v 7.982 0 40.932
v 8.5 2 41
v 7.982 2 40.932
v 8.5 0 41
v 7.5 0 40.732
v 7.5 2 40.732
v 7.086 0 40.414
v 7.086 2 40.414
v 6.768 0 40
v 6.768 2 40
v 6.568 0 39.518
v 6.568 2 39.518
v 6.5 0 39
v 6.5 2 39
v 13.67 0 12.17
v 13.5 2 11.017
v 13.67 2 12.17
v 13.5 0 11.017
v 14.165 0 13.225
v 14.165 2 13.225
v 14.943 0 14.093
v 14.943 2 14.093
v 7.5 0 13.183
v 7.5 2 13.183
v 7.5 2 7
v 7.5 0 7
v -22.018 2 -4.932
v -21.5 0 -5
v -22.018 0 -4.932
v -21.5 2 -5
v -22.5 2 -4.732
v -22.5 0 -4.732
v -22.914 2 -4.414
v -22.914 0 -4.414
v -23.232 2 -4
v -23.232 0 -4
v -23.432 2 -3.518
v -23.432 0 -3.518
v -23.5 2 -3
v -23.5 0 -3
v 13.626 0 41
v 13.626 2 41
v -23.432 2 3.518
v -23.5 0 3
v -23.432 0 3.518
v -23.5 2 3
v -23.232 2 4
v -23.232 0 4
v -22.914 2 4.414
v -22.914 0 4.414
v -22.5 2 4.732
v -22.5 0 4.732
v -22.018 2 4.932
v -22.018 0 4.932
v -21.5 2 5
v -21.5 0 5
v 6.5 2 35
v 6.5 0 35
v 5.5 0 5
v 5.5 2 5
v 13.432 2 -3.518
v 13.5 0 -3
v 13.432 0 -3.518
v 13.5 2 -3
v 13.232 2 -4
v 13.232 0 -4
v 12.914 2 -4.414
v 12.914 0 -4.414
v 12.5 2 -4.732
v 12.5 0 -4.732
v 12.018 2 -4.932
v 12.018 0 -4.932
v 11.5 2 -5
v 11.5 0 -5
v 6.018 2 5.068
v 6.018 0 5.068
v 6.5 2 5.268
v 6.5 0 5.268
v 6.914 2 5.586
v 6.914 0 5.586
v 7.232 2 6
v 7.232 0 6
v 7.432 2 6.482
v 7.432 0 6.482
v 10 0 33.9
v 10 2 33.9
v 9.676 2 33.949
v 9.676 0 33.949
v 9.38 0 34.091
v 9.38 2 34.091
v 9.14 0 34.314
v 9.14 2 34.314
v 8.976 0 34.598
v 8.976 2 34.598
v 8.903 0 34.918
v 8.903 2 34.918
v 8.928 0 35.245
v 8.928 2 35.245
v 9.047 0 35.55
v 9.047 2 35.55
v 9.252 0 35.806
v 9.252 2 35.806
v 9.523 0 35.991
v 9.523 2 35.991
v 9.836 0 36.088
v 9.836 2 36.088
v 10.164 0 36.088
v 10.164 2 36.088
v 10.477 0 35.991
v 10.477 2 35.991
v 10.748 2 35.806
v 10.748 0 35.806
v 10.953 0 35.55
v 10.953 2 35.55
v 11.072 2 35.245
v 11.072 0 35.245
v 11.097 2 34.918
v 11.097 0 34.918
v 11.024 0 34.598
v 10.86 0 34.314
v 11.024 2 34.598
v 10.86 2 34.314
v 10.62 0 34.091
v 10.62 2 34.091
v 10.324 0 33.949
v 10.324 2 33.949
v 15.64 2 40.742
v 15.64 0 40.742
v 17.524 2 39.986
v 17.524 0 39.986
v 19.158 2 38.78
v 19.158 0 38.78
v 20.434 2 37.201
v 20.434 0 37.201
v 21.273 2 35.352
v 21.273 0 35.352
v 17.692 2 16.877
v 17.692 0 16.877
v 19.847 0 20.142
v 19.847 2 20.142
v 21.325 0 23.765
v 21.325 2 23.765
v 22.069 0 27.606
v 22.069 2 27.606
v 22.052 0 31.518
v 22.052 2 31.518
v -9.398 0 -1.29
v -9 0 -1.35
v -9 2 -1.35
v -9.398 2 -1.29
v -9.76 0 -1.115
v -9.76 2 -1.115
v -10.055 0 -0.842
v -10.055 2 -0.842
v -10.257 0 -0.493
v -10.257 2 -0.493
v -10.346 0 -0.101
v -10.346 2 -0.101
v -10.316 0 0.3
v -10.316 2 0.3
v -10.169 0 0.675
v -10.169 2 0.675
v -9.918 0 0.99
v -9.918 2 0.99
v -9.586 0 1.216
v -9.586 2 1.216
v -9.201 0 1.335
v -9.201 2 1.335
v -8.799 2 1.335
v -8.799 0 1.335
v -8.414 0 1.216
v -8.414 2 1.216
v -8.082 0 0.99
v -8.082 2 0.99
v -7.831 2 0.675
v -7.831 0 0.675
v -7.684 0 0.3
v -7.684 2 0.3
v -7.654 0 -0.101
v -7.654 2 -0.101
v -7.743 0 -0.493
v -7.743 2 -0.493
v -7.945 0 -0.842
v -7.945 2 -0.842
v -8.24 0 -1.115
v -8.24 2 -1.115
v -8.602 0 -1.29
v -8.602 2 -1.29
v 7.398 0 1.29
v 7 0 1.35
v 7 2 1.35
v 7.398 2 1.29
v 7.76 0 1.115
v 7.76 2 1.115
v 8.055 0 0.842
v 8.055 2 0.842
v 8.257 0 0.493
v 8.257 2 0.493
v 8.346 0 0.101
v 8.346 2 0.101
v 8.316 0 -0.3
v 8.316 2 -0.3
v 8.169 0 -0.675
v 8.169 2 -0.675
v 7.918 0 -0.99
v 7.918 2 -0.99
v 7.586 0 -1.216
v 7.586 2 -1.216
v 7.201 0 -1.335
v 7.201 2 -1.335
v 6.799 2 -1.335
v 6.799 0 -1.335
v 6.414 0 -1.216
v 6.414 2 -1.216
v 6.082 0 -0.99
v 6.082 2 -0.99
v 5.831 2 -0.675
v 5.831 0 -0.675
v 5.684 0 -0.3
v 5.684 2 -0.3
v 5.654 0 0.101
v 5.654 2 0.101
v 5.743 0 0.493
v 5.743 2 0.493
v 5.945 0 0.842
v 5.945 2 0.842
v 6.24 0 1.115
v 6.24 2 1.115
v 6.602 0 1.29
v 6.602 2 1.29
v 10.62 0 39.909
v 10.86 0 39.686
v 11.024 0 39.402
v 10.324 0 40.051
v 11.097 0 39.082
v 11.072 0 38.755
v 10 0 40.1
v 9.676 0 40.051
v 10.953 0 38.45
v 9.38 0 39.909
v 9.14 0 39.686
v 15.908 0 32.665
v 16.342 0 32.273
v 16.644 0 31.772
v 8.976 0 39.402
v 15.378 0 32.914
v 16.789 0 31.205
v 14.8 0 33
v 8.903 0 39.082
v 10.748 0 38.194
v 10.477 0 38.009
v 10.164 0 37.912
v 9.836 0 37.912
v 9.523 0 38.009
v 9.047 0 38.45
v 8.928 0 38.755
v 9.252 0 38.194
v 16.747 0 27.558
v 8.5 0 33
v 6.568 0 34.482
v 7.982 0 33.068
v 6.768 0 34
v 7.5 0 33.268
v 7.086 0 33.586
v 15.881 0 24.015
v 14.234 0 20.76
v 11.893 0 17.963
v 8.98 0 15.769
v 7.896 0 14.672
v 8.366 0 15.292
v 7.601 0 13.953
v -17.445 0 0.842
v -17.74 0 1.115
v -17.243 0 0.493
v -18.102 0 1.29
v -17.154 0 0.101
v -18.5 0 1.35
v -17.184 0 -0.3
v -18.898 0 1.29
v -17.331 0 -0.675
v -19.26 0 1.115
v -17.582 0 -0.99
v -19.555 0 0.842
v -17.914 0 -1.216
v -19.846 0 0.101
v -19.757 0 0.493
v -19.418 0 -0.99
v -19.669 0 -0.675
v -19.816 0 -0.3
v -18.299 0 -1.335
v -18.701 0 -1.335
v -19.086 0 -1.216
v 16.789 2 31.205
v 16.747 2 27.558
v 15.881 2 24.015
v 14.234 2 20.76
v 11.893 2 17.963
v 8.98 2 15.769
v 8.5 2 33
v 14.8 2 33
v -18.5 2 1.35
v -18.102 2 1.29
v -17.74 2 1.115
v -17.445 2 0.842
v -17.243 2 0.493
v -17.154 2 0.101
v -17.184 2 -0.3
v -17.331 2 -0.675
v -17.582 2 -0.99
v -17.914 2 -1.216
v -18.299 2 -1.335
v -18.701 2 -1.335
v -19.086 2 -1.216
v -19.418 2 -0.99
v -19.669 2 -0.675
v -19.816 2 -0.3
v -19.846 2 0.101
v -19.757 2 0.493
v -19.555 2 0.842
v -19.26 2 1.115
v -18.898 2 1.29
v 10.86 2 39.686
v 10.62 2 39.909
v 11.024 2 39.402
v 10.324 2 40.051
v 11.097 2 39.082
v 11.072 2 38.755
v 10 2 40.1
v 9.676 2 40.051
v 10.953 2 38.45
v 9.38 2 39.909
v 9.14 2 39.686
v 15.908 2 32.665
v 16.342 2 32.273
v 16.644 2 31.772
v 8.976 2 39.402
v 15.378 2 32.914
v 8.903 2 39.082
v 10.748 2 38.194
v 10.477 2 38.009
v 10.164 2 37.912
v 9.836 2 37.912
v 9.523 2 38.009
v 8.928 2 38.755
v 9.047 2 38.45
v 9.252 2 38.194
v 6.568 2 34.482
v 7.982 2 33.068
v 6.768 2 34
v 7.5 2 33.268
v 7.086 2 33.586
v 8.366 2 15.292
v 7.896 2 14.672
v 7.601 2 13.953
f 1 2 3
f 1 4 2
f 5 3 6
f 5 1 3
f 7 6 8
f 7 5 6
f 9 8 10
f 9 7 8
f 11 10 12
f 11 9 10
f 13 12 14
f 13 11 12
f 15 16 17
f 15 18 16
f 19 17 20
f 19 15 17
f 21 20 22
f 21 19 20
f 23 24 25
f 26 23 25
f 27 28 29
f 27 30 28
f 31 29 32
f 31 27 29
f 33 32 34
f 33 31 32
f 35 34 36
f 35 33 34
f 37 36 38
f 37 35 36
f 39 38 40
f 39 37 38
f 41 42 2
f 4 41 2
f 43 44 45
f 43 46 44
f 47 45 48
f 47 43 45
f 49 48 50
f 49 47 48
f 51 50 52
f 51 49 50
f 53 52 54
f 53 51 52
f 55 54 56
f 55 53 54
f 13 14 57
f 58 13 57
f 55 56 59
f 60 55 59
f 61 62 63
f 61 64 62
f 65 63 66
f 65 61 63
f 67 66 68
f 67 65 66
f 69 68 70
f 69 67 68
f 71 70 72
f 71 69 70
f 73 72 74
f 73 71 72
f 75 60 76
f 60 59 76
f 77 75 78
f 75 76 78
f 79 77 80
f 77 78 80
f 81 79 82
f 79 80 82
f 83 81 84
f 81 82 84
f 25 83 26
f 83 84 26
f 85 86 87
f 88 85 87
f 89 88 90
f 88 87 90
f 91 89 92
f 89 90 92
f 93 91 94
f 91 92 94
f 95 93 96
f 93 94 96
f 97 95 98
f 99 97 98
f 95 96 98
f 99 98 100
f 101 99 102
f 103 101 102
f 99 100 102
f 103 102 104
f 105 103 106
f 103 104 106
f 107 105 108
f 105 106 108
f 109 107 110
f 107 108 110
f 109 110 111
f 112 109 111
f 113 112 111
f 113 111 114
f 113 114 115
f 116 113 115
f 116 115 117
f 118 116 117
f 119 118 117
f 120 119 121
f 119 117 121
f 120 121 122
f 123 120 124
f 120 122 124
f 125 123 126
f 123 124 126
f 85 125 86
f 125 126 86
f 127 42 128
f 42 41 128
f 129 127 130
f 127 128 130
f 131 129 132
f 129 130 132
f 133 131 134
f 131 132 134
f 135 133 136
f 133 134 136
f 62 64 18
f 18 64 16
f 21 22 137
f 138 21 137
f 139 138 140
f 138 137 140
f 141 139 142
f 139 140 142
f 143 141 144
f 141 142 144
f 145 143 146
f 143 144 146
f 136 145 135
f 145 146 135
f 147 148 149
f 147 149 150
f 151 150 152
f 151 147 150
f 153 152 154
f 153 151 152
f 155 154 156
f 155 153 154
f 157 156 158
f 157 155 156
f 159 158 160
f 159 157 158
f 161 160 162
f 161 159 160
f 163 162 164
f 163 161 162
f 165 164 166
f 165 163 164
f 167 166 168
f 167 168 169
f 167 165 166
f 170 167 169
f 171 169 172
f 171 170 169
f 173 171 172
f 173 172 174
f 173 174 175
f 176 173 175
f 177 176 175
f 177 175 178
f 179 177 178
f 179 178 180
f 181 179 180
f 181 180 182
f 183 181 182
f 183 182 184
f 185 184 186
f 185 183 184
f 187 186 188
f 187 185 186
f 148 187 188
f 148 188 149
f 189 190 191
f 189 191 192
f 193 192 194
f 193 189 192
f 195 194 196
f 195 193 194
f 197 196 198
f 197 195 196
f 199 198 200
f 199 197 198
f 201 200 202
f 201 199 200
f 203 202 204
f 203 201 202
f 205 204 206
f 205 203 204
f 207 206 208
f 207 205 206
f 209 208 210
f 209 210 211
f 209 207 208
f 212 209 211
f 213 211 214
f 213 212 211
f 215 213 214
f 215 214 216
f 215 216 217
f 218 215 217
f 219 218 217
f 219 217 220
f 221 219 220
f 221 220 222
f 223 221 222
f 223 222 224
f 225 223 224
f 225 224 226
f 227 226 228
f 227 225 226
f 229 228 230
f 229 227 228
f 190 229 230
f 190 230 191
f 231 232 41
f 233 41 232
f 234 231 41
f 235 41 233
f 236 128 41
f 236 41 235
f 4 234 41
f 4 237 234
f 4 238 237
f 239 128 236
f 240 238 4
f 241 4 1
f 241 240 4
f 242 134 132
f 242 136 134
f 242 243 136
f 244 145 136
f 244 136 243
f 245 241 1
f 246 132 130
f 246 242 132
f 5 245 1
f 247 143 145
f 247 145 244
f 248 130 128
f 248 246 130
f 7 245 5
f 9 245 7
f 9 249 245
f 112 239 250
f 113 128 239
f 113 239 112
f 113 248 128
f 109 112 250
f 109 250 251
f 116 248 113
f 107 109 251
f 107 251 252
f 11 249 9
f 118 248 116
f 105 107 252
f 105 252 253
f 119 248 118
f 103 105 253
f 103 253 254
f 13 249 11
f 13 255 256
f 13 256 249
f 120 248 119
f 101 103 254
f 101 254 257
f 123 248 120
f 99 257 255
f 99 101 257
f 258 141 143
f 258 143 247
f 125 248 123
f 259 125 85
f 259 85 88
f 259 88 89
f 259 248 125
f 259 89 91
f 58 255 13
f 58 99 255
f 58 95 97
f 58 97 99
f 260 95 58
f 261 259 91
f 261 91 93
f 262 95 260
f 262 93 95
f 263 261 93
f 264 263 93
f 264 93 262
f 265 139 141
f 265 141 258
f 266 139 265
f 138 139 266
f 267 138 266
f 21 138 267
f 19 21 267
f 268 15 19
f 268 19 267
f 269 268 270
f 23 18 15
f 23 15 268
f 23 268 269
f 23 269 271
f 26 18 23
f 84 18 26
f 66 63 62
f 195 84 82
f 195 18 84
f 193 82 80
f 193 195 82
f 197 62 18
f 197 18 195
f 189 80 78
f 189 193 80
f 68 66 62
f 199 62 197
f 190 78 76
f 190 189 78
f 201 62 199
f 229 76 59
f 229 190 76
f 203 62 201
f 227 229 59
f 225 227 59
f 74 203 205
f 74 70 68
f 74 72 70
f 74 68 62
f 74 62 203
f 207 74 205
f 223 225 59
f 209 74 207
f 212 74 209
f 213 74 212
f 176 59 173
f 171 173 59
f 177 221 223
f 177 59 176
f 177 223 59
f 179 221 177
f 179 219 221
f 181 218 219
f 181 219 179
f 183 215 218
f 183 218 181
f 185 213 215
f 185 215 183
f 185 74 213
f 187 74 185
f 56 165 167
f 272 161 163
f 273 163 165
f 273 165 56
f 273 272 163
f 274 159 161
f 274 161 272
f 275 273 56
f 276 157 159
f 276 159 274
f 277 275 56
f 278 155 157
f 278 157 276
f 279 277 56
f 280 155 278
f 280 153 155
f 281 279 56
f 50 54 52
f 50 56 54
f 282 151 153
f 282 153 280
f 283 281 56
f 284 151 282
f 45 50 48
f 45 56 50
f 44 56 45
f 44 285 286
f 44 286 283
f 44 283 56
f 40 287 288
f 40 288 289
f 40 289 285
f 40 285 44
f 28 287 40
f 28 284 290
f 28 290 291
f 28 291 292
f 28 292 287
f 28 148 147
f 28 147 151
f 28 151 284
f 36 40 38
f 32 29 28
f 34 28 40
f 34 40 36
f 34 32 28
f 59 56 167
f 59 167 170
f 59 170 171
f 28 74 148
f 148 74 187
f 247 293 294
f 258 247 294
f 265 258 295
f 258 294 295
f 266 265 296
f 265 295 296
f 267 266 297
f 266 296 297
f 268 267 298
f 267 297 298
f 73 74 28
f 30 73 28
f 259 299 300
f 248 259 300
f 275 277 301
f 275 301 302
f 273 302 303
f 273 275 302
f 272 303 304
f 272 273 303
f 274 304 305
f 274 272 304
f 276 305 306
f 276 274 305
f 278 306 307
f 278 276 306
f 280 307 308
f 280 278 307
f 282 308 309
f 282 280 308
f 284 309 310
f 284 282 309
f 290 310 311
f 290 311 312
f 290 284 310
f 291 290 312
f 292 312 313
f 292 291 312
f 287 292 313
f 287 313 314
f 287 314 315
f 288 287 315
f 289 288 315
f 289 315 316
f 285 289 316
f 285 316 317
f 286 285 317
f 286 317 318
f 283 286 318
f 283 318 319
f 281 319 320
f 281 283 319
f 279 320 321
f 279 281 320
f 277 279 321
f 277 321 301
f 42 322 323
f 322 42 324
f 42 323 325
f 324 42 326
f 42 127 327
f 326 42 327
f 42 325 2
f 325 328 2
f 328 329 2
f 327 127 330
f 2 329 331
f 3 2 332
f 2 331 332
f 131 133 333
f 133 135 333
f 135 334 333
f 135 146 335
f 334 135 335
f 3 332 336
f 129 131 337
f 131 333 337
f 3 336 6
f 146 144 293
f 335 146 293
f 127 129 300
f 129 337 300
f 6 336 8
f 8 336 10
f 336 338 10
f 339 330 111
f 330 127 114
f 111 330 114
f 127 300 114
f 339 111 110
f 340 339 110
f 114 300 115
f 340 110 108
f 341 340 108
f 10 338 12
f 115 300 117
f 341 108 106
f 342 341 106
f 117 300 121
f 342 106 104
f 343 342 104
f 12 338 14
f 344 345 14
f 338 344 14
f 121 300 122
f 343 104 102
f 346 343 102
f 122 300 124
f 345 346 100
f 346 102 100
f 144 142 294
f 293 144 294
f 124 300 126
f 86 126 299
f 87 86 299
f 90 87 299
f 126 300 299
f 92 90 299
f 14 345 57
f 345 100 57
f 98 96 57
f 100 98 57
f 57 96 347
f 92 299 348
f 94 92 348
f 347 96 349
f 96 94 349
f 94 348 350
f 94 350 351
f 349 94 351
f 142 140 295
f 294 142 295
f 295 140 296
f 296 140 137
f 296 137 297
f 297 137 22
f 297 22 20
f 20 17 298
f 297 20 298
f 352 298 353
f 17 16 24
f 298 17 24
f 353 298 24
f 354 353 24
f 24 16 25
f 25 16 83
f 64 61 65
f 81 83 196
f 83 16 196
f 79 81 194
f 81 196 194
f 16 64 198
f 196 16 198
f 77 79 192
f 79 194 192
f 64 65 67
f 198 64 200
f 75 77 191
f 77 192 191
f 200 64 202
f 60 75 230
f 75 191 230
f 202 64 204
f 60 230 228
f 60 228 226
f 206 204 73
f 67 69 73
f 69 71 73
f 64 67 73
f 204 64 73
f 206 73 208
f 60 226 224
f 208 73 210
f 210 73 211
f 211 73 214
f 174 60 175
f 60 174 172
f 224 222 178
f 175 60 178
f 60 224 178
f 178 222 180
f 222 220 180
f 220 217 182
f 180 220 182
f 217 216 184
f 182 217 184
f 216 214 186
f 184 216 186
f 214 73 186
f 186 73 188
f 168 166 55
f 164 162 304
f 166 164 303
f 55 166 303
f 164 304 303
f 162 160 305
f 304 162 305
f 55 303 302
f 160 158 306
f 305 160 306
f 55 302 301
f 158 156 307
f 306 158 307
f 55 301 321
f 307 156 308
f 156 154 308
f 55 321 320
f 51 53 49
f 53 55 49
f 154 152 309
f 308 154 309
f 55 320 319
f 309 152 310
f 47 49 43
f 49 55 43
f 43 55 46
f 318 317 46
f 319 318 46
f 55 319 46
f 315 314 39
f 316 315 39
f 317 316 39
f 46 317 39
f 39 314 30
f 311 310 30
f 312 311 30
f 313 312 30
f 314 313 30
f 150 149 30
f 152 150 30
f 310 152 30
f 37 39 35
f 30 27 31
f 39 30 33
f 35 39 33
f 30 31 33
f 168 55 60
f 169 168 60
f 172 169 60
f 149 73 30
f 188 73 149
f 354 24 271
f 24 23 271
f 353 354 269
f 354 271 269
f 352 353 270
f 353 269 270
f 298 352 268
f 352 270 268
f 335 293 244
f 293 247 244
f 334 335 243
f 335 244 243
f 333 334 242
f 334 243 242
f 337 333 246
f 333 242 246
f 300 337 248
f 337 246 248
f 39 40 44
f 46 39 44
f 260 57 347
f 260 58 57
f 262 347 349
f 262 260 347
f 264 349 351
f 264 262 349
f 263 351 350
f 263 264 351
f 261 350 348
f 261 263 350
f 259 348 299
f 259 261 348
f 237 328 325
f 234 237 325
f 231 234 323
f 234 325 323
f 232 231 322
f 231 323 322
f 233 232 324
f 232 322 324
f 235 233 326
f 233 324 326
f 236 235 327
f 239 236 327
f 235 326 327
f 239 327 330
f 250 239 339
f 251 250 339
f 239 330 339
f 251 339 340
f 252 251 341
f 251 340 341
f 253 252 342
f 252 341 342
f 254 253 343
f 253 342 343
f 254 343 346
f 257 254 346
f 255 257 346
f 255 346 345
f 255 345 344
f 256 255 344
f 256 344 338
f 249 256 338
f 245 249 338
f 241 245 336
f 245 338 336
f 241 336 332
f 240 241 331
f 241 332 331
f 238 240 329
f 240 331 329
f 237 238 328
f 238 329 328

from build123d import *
from OCP.BRepFilletAPI import BRepFilletAPI_MakeFillet

# Parameters (mm, degrees)
SKETCH_1_R      = 1.35
EXTRUDE_1_DEPTH = 2
SKETCH_2_R      = 1.1
EXTRUDE_2_DEPTH = 2
FILLET_3_R1     = 3
FILLET_3_R2     = 4
FILLET_3_R3     = 2
FILLET_3_R4     = 8
FILLET_4_R      = 2


with BuildPart() as part:
    # 草图1 → 凸台-拉伸1 (new body)
    with BuildSketch(Plane(origin=(0, 0, 0), x_dir=(1, 0, 0), z_dir=(0, 1, 0))):
        Polygon((-13.5, -5), (13.5, -5), (13.5, 5), (-13.5, 5), (-23.5, 5), (-23.5, -5), align=None)
        with Locations(Location((7, 0, 0), (0, 0, 270))):
            Circle(SKETCH_1_R, mode=Mode.SUBTRACT)
        with Locations(Location((-9, 0, 0), (0, 0, 90))):
            Circle(SKETCH_1_R, mode=Mode.SUBTRACT)
        with Locations(Location((-18.5, 0, 0), (0, 0, 270))):
            Circle(SKETCH_1_R, mode=Mode.SUBTRACT)
    extrude(amount=EXTRUDE_1_DEPTH)

    # 草图2 → 凸台-拉伸2 (add)
    with BuildSketch(Plane(origin=(0, 2, 0), x_dir=(1, 0, 0), z_dir=(0, 1, 0))):
        with BuildLine():
            Line((13.5, -5), (13.5, -13))
            ThreePointArc((13.5, -13), (21.845175456, -25.956218669), (18.5, -41))
            Line((18.5, -41), (6.5, -41))
            Line((6.5, -41), (6.5, -33))
            Line((6.5, -33), (16.5, -33))
            ThreePointArc((16.5, -33), (15.184290219, -22.40785489), (7.5, -15))
            Line((7.5, -15), (7.5, -5))
            Line((7.5, -5), (13.5, -5))
        make_face()
        with Locations(Location((10, -39, 0), (0, 0, 270))):
            Circle(SKETCH_2_R, mode=Mode.SUBTRACT)
        with Locations(Location((10, -35, 0), (0, 0, 90))):
            Circle(SKETCH_2_R, mode=Mode.SUBTRACT)
    extrude(amount=-EXTRUDE_2_DEPTH)

    # 圆角3: one fillet with a radius per group of edges: ONE call of the kernel's fillet builder (fillet() takes one radius for all edges)
    fillet_3_edges_1 = [part.edges().sort_by_distance(p)[0] for p in [
        (7.5, 1, 15),
    ]]
    fillet_3_edges_2 = [part.edges().sort_by_distance(p)[0] for p in [
        (13.5, 1, 13),
    ]]
    fillet_3_edges_3 = [part.edges().sort_by_distance(p)[0] for p in [
        (16.5, 1, 33),
    ]]
    fillet_3_edges_4 = [part.edges().sort_by_distance(p)[0] for p in [
        (18.5, 1, 41),
    ]]
    fillet_3 = BRepFilletAPI_MakeFillet(part.part.solid().wrapped)
    for e in fillet_3_edges_1:
        fillet_3.Add(FILLET_3_R1, e.wrapped)
    for e in fillet_3_edges_2:
        fillet_3.Add(FILLET_3_R2, e.wrapped)
    for e in fillet_3_edges_3:
        fillet_3.Add(FILLET_3_R3, e.wrapped)
    for e in fillet_3_edges_4:
        fillet_3.Add(FILLET_3_R4, e.wrapped)
    add(Compound.cast(fillet_3.Shape()), mode=Mode.REPLACE)

    # 圆角4
    fillet_4_edges = [part.edges().sort_by_distance(p)[0] for p in [
        (-23.5, 1, 5),
        (-23.5, 1, -5),
        (13.5, 1, -5),
        (7.5, 1, 5),
        (6.5, 1, 41),
        (6.5, 1, 33),
    ]]
    fillet(fillet_4_edges, radius=FILLET_4_R)


solid = part.part
